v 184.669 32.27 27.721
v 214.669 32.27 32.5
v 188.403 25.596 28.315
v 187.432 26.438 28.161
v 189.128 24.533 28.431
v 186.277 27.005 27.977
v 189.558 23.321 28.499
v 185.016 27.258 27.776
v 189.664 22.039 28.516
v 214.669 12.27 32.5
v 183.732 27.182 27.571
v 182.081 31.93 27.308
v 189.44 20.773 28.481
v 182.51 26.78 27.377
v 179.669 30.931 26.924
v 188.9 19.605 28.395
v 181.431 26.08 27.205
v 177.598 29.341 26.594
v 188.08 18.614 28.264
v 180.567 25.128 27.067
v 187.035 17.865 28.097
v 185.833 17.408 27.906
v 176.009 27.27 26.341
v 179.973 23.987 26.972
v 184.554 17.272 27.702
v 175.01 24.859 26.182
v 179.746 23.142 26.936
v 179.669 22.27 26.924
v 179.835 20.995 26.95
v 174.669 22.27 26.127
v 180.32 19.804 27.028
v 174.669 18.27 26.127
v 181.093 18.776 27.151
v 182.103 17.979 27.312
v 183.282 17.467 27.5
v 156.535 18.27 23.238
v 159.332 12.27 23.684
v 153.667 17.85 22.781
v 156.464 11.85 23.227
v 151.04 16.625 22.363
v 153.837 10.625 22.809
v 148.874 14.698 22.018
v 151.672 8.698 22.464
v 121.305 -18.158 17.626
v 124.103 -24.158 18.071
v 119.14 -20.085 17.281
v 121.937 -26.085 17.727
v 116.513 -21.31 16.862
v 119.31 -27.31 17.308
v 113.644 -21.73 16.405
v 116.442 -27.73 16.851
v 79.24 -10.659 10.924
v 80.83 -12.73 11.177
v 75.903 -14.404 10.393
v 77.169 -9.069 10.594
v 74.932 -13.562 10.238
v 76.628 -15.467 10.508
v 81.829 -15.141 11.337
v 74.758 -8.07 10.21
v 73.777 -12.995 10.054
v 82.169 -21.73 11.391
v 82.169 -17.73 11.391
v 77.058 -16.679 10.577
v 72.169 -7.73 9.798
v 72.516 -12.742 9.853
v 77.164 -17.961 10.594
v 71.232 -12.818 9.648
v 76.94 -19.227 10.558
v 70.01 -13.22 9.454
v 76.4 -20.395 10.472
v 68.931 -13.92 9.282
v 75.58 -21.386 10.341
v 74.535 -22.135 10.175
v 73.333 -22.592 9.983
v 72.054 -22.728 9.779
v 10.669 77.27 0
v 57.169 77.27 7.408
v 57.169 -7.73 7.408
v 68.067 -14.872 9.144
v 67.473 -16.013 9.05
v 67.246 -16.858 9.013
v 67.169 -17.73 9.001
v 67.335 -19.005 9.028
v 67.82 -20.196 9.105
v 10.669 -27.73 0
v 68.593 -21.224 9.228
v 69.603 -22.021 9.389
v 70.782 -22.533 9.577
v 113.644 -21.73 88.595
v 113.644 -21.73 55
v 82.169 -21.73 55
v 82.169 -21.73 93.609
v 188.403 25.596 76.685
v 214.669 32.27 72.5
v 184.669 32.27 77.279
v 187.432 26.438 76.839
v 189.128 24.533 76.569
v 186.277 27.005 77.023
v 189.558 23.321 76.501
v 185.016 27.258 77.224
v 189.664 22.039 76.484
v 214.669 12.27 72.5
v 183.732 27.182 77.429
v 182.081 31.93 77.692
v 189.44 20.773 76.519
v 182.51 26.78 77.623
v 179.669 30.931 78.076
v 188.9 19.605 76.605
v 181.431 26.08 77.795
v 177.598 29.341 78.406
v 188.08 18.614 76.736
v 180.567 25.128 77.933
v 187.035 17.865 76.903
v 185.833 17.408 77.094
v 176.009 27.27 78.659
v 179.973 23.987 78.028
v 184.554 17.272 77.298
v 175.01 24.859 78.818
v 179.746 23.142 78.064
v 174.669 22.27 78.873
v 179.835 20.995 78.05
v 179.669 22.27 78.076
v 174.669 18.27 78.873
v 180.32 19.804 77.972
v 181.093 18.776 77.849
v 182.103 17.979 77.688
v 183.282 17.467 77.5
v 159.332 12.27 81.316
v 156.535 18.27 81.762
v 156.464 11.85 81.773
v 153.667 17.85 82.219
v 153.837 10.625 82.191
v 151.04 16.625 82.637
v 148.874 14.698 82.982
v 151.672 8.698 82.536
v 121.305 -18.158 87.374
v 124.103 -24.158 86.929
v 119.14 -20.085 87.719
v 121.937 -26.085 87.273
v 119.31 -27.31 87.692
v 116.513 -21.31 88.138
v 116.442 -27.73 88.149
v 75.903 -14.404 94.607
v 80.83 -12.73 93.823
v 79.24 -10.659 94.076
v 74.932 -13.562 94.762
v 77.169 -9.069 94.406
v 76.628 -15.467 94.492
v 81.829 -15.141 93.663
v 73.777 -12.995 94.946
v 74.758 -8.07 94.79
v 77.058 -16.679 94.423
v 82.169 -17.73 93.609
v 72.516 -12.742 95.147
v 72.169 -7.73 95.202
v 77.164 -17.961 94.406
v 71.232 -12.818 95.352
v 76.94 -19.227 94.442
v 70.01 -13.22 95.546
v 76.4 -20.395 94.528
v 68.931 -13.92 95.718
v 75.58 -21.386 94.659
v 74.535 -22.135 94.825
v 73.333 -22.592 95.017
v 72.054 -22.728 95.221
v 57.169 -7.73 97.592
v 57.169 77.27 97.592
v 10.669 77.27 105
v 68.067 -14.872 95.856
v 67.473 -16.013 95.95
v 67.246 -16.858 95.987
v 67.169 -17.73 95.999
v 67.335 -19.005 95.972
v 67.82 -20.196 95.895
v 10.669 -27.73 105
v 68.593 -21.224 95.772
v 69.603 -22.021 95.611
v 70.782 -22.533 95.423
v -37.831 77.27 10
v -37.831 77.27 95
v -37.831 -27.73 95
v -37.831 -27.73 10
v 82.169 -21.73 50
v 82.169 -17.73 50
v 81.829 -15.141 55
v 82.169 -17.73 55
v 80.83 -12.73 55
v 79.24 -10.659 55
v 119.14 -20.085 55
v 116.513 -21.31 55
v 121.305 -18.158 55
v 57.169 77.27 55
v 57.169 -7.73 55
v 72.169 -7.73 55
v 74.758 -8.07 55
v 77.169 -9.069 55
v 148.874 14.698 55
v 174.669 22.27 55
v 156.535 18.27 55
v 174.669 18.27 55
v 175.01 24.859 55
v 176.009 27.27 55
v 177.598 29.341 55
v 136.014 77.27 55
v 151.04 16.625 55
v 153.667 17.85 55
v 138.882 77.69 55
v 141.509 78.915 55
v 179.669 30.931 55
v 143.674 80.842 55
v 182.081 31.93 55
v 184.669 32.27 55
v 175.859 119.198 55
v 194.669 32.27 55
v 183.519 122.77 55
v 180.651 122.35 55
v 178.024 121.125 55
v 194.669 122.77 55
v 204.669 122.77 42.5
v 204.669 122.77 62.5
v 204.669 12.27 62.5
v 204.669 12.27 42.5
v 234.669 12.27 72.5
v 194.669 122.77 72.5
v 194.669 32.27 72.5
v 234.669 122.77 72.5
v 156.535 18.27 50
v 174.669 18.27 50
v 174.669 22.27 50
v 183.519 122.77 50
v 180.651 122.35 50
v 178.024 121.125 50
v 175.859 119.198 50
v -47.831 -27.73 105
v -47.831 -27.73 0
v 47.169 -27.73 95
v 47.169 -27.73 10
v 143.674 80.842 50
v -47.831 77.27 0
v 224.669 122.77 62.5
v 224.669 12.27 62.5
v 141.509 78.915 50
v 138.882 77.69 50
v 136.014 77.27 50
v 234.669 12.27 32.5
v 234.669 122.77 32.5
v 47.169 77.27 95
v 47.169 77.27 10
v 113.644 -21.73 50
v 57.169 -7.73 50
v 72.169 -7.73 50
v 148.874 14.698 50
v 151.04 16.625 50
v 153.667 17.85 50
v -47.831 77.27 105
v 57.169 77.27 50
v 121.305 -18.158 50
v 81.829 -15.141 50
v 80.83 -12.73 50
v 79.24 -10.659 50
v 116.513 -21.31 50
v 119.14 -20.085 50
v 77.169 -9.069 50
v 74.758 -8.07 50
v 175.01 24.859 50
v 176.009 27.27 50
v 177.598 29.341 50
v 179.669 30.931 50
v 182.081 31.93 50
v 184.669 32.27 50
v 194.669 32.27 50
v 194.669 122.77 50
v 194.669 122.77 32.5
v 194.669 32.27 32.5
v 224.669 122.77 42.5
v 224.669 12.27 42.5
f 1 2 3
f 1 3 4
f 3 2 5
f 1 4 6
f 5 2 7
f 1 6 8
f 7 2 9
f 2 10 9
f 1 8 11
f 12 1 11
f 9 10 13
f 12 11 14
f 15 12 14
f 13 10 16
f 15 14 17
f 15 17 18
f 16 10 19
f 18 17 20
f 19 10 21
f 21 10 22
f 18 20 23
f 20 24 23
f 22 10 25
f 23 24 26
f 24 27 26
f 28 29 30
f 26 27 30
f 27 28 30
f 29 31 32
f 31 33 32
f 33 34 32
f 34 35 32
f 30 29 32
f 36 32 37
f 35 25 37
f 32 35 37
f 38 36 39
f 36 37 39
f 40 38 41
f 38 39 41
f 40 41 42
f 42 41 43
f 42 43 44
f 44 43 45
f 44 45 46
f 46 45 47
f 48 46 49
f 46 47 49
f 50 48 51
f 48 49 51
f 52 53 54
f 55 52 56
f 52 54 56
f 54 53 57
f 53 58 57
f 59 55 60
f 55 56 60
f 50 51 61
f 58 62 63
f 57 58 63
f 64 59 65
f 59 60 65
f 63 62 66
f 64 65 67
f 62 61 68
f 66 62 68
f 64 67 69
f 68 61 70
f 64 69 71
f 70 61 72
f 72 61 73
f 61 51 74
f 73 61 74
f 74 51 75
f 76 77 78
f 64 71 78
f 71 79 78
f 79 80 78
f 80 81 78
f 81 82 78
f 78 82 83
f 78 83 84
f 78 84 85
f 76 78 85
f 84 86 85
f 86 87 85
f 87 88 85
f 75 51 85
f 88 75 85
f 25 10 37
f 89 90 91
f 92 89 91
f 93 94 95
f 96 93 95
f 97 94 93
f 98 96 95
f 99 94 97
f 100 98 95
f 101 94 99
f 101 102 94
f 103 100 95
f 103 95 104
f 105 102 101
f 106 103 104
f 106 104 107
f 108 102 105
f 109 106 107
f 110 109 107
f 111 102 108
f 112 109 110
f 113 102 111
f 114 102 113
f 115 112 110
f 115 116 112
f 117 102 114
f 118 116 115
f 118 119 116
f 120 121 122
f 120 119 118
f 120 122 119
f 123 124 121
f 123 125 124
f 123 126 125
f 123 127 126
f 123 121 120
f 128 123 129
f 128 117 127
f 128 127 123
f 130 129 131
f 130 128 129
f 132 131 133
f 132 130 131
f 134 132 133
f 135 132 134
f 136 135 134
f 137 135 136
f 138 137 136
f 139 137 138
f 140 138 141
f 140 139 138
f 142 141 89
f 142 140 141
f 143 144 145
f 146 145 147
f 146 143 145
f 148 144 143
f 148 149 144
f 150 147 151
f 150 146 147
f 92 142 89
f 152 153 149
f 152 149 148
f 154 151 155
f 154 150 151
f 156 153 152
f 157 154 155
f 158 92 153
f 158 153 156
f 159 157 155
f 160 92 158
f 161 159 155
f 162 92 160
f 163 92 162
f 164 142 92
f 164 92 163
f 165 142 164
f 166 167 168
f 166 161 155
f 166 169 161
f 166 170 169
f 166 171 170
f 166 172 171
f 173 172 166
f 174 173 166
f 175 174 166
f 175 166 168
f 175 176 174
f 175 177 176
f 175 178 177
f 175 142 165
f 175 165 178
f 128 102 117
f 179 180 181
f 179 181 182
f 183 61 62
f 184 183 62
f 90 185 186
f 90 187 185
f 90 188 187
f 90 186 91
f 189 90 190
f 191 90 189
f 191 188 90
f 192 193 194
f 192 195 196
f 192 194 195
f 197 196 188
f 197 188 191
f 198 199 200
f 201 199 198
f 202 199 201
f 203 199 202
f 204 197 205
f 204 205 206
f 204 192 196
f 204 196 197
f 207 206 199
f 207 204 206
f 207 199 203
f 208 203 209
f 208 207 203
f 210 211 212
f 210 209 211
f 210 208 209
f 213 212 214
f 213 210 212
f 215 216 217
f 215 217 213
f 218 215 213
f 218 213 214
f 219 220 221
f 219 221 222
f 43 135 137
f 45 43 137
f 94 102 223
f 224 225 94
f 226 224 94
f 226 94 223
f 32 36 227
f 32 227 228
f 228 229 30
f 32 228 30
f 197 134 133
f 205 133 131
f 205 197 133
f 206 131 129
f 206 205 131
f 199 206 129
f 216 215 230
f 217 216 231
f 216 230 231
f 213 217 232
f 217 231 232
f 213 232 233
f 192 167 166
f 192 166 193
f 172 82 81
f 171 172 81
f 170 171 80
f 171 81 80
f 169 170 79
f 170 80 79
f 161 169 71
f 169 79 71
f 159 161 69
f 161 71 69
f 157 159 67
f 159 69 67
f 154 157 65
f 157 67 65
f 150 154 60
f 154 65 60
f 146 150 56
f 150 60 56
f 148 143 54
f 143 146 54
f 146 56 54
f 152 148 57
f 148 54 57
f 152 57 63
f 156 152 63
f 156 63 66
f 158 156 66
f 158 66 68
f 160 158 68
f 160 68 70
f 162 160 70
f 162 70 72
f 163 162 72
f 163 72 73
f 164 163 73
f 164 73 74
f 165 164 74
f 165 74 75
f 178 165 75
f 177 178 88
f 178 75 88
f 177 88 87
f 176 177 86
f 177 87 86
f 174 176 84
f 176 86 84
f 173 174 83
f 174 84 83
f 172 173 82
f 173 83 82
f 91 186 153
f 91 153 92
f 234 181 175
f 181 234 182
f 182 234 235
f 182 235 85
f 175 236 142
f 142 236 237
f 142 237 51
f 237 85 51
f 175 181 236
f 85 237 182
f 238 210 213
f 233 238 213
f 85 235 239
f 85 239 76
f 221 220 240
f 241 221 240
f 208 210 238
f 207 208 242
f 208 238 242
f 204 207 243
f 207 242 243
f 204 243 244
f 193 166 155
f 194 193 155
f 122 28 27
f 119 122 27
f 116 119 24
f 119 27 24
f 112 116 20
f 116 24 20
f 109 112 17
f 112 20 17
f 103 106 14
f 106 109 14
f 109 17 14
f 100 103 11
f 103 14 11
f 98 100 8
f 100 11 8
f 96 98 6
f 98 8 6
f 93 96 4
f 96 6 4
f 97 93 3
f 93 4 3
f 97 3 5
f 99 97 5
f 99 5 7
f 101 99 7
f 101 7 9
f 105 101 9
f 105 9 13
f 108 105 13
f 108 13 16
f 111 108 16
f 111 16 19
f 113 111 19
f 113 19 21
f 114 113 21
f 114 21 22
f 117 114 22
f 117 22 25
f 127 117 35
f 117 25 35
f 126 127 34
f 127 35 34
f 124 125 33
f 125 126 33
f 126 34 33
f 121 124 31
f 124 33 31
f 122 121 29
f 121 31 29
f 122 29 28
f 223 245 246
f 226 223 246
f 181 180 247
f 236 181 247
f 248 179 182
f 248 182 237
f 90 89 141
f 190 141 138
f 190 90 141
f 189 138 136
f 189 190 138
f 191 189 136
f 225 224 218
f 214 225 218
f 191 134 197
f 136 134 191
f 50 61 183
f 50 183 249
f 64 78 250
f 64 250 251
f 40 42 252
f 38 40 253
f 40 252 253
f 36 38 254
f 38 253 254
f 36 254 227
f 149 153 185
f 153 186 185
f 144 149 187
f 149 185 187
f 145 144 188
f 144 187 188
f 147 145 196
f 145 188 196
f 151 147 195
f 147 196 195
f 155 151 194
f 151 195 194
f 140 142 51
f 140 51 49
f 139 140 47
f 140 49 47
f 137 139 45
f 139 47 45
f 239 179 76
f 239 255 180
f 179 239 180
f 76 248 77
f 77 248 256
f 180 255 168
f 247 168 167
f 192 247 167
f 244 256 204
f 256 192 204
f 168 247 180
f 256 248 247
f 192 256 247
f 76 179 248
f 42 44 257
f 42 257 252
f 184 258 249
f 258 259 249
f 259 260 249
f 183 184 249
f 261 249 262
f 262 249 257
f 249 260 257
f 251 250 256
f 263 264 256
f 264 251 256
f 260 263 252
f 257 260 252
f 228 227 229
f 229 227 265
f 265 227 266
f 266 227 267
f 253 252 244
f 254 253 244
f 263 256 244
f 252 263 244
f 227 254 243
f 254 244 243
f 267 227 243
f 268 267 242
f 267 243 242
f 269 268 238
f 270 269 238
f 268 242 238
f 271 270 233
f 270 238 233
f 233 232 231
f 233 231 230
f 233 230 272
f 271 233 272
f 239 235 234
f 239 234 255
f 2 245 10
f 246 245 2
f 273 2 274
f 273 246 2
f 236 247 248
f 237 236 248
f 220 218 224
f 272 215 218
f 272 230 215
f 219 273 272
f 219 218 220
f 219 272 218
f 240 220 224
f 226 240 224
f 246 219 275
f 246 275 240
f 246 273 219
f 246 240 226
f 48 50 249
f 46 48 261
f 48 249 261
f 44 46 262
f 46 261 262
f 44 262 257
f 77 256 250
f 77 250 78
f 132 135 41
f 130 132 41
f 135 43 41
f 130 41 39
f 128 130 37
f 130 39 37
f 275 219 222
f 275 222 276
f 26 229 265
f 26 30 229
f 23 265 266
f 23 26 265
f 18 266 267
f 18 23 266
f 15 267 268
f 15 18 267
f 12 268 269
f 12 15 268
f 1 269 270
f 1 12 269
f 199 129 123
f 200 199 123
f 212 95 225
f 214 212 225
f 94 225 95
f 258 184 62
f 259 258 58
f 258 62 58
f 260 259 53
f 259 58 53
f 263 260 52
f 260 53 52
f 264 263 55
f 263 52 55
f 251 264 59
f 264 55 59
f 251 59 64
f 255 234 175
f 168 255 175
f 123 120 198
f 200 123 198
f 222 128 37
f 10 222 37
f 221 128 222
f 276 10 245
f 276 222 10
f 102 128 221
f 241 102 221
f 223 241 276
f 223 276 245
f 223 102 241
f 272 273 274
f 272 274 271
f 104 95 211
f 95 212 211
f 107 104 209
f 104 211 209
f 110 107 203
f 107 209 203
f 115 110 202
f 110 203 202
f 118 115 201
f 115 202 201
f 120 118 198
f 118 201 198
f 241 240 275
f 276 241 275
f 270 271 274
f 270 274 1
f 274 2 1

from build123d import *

# Parameters (mm, degrees)
SKETCH1_W           = 282.5
SKETCH1_H           = 150.5
BOSS_EXTRUDE2_DEPTH = 105
SKETCH16_W          = 80
SKETCH16_H          = 40
SKETCH16_W_2        = 130
SKETCH16_H_2        = 45.5
CUT_EXTRUDE10_DEPTH = 105
SKETCH17_W          = 20
SKETCH17_H          = 32.5
CUT_EXTRUDE11_DEPTH = 110.5
CUT_EXTRUDE12_DEPTH = 90.5
SKETCH19_W          = 92.5
SKETCH19_H          = 50
CUT_EXTRUDE13_DEPTH = 14
SKETCH20_W          = 92.5
SKETCH20_H          = 50
CUT_EXTRUDE14_DEPTH = 14
SKETCH21_W          = 25
SKETCH21_H          = 50
CUT_EXTRUDE15_DEPTH = 85
SKETCH22_W          = 85
SKETCH22_H          = 85
CUT_EXTRUDE16_DEPTH = 105
CUT_EXTRUDE17_DEPTH = 50
CUT_EXTRUDE18_DEPTH = 120
CUT_EXTRUDE19_DEPTH = 50
SKETCH27_R          = 5
CUT_EXTRUDE20_DEPTH = 120
CUT_EXTRUDE21_DEPTH = 160
FILLET1_R           = 10
FILLET2_R           = 10
CUT_EXTRUDE22_DEPTH = 160
FILLET3_R           = 10
SKETCH30_W          = 20
SKETCH30_H          = 20
CUT_EXTRUDE23_DEPTH = 160


with BuildPart() as part:
    # Sketch1 → Boss-Extrude2 (new body)
    with BuildSketch(Plane.XY):
        with Locations((93.419387358, 47.520353684)):
            Rectangle(SKETCH1_W, SKETCH1_H)
    extrude(amount=BOSS_EXTRUDE2_DEPTH)

    # Sketch16 → Cut-Extrude10 (cut)
    with BuildSketch(Plane.XY.offset(105)):
        with Locations((194.669387358, -7.729646316)):
            Rectangle(SKETCH16_W, SKETCH16_H)
        with Locations((17.169387358, 100.020353684)):
            Rectangle(SKETCH16_W_2, SKETCH16_H_2)
    extrude(amount=-CUT_EXTRUDE10_DEPTH, mode=Mode.SUBTRACT)

    # Sketch17 → Cut-Extrude11 (cut)
    with BuildSketch(Plane(origin=(0, 122.770353684, 0), x_dir=(1, 0, 0), z_dir=(0, 1, 0))):
        with Locations((224.669387358, -16.25)):
            Rectangle(SKETCH17_W, SKETCH17_H)
        with Locations((224.669387358, -88.75)):
            Rectangle(SKETCH17_W, SKETCH17_H)
    extrude(amount=-CUT_EXTRUDE11_DEPTH, mode=Mode.SUBTRACT)

    # Sketch18 → Cut-Extrude12 (cut)
    with BuildSketch(Plane(origin=(0, 122.770353684, 0), x_dir=(1, 0, 0), z_dir=(0, 1, 0))):
        Polygon((214.669387358, -32.5), (194.669387358, -32.5), (194.669387358, -50), (82.169387358, -50), (82.169387358, 0), (214.669387358, 0), align=None)
        Polygon((214.669387358, -72.5), (194.669387358, -72.5), (194.669387358, -55), (82.169387358, -55), (82.169387358, -105), (214.669387358, -105), align=None)
    extrude(amount=-CUT_EXTRUDE12_DEPTH, mode=Mode.SUBTRACT)

    # Sketch19 → Cut-Extrude13 (cut)
    with BuildSketch(Plane(origin=(0, 32.270353684, 0), x_dir=(1, 0, 0), z_dir=(0, 1, 0))):
        with Locations((128.419387358, -80)):
            Rectangle(SKETCH19_W, SKETCH19_H)
    extrude(amount=-CUT_EXTRUDE13_DEPTH, mode=Mode.SUBTRACT)

    # Sketch20 → Cut-Extrude14 (cut)
    with BuildSketch(Plane(origin=(0, 32.270353684, 0), x_dir=(1, 0, 0), z_dir=(0, 1, 0))):
        with Locations((128.419387358, -25)):
            Rectangle(SKETCH20_W, SKETCH20_H)
    extrude(amount=-CUT_EXTRUDE14_DEPTH, mode=Mode.SUBTRACT)

    # Sketch21 → Cut-Extrude15 (cut)
    with BuildSketch(Plane(origin=(0, 77.270353684, 0), x_dir=(1, 0, 0), z_dir=(0, 1, 0))):
        with Locations((69.669387358, -25)):
            Rectangle(SKETCH21_W, SKETCH21_H)
        with Locations((69.669387358, -80)):
            Rectangle(SKETCH21_W, SKETCH21_H)
    extrude(amount=-CUT_EXTRUDE15_DEPTH, mode=Mode.SUBTRACT)

    # Sketch22 → Cut-Extrude16 (cut)
    with BuildSketch(Plane(origin=(0, 77.270353684, 0), x_dir=(1, 0, 0), z_dir=(0, 1, 0))):
        with Locations((4.669387358, -52.5)):
            Rectangle(SKETCH22_W, SKETCH22_H)
    extrude(amount=-CUT_EXTRUDE16_DEPTH, mode=Mode.SUBTRACT)

    # Sketch24 → Cut-Extrude17 (cut)
    with BuildSketch(Plane.XY.offset(105)):
        Polygon((151.871541409, 18.270353684), (118.307556162, -21.729646316), (82.169387358, -21.729646316), (82.169387358, -7.729646316), (82.169387358, 18.270353684), align=None)
    extrude(amount=-CUT_EXTRUDE17_DEPTH, mode=Mode.SUBTRACT)

    # Sketch25 → Cut-Extrude18 (cut)
    with BuildSketch(Plane.XY.offset(105)):
        Polygon((154.669387358, -27.729646316), (154.669387358, 12.270353684), (121.105402111, -27.729646316), align=None)
    extrude(amount=-CUT_EXTRUDE18_DEPTH, mode=Mode.SUBTRACT)

    # Sketch26 → Cut-Extrude19 (cut)
    with BuildSketch(Plane(origin=(0, 0, 0), x_dir=(-1, 0, 0), z_dir=(0, 0, -1))):
        Polygon((-82.169387358, -7.729646316), (-82.169387358, -21.729646316), (-118.307556162, -21.729646316), (-151.871541409, 18.270353684), (-82.169387358, 18.270353684), align=None)
    extrude(amount=-CUT_EXTRUDE19_DEPTH, mode=Mode.SUBTRACT)

    # Sketch27 → Cut-Extrude20 (cut)
    with BuildSketch(Plane(origin=(0, 0, 0), x_dir=(-1, 0, 0), z_dir=(0, 0, -1))):
        with Locations((-184.669387358, 22.270353684)):
            Circle(SKETCH27_R)
        with Locations((-72.169387358, -17.729646316)):
            Circle(SKETCH27_R)
    extrude(amount=-CUT_EXTRUDE20_DEPTH, mode=Mode.SUBTRACT)

    # Sketch28 → Cut-Extrude21 (cut)
    with BuildSketch(Plane.XZ.offset(27.729646316)):
        Polygon((10.669387358, 105), (214.669387358, 105), (214.669387358, 72.5), align=None)
        Polygon((214.669387358, 32.5), (10.669387358, 0), (214.669387358, 0), align=None)
    extrude(amount=-CUT_EXTRUDE21_DEPTH, mode=Mode.SUBTRACT)

    # Fillet1
    fillet1_edges = [part.edges().sort_by_distance(p)[0] for p in [
        (174.669387358, 32.270353684, 38.06372549),
        (82.169387358, -7.729646316, 30.695465686),
        (82.169387358, -7.729646316, 74.304534314),
        (174.669387358, 32.270353684, 66.93627451),
    ]]
    fillet(fillet1_edges, radius=FILLET1_R)

    # Fillet2
    fillet2_edges = [part.edges().sort_by_distance(p)[0] for p in [
        (151.871541409, 18.270353684, 68.752279395),
        (118.307556162, -21.729646316, 71.425881161),
        (151.871541409, 18.270353684, 36.247720605),
        (118.307556162, -21.729646316, 33.574118839),
        (154.669387358, 12.270353684, 52.5),
        (121.105402111, -27.729646316, 52.5),
    ]]
    fillet(fillet2_edges, radius=FILLET2_R)

    # Sketch29 → Cut-Extrude22 (cut)
    with BuildSketch(Plane.XY.offset(55)):
        Polygon((82.169387358, 77.270353684), (140.676980695, 77.270353684), (178.856013913, 122.770353684), (82.169387358, 122.770353684), align=None)
    extrude(amount=-CUT_EXTRUDE22_DEPTH, mode=Mode.SUBTRACT)

    # Fillet3
    fillet3_edges = [part.edges().sort_by_distance(p)[0] for p in [
        (178.856013913, 122.770353684, 52.5),
        (140.676980695, 77.270353684, 52.5),
    ]]
    fillet(fillet3_edges, radius=FILLET3_R)

    # Sketch30 → Cut-Extrude23 (cut)
    with BuildSketch(Plane(origin=(0, 122.770353684, 0), x_dir=(1, 0, 0), z_dir=(0, 1, 0))):
        with Locations((214.669387358, -52.5)):
            Rectangle(SKETCH30_W, SKETCH30_H)
    extrude(amount=-CUT_EXTRUDE23_DEPTH, mode=Mode.SUBTRACT)


solid = part.part
